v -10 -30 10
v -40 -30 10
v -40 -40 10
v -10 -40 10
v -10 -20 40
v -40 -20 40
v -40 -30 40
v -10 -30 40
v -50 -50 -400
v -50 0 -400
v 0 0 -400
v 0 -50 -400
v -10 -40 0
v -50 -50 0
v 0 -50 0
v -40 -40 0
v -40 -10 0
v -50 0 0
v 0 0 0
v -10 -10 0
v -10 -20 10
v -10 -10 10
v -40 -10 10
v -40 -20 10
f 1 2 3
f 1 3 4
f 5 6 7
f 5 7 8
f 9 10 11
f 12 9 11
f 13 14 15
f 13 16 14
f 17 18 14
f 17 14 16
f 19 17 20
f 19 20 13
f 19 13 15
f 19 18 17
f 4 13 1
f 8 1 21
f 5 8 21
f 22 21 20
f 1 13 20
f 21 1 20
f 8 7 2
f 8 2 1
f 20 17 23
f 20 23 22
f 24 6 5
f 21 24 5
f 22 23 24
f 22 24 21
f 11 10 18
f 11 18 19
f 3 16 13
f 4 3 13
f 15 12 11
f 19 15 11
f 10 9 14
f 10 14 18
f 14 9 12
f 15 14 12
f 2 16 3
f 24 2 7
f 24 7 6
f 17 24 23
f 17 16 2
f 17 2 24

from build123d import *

# Parameters (mm, degrees)
F0_W     = 50
F0_H     = 50
F1_DEPTH = 400
F2_W     = 30
F2_H     = 30
F3_DEPTH = 40
F4_W     = 30
F4_H     = 10
F5_DEPTH = 30


with BuildPart() as f1:
    # F0 (on Top) → F1 (new body)
    with BuildSketch(Plane.XY):
        with Locations((-25, -25)):
            Rectangle(F0_W, F0_H)
    extrude(amount=-F1_DEPTH)

    # F2 (on face) → F3 (join)
    with BuildSketch(Plane.XY):
        with Locations((-25, -25)):
            Rectangle(F2_W, F2_H)
    extrude(amount=F3_DEPTH)

    # F4 (on face) → F5 (cut)
    with BuildSketch(Plane.XY.offset(40)):
        with Locations((-25, -35)):
            Rectangle(F4_W, F4_H)
        with Locations((-25, -15)):
            Rectangle(F4_W, F4_H)
    extrude(amount=-F5_DEPTH, mode=Mode.SUBTRACT)


solid = f1.part
